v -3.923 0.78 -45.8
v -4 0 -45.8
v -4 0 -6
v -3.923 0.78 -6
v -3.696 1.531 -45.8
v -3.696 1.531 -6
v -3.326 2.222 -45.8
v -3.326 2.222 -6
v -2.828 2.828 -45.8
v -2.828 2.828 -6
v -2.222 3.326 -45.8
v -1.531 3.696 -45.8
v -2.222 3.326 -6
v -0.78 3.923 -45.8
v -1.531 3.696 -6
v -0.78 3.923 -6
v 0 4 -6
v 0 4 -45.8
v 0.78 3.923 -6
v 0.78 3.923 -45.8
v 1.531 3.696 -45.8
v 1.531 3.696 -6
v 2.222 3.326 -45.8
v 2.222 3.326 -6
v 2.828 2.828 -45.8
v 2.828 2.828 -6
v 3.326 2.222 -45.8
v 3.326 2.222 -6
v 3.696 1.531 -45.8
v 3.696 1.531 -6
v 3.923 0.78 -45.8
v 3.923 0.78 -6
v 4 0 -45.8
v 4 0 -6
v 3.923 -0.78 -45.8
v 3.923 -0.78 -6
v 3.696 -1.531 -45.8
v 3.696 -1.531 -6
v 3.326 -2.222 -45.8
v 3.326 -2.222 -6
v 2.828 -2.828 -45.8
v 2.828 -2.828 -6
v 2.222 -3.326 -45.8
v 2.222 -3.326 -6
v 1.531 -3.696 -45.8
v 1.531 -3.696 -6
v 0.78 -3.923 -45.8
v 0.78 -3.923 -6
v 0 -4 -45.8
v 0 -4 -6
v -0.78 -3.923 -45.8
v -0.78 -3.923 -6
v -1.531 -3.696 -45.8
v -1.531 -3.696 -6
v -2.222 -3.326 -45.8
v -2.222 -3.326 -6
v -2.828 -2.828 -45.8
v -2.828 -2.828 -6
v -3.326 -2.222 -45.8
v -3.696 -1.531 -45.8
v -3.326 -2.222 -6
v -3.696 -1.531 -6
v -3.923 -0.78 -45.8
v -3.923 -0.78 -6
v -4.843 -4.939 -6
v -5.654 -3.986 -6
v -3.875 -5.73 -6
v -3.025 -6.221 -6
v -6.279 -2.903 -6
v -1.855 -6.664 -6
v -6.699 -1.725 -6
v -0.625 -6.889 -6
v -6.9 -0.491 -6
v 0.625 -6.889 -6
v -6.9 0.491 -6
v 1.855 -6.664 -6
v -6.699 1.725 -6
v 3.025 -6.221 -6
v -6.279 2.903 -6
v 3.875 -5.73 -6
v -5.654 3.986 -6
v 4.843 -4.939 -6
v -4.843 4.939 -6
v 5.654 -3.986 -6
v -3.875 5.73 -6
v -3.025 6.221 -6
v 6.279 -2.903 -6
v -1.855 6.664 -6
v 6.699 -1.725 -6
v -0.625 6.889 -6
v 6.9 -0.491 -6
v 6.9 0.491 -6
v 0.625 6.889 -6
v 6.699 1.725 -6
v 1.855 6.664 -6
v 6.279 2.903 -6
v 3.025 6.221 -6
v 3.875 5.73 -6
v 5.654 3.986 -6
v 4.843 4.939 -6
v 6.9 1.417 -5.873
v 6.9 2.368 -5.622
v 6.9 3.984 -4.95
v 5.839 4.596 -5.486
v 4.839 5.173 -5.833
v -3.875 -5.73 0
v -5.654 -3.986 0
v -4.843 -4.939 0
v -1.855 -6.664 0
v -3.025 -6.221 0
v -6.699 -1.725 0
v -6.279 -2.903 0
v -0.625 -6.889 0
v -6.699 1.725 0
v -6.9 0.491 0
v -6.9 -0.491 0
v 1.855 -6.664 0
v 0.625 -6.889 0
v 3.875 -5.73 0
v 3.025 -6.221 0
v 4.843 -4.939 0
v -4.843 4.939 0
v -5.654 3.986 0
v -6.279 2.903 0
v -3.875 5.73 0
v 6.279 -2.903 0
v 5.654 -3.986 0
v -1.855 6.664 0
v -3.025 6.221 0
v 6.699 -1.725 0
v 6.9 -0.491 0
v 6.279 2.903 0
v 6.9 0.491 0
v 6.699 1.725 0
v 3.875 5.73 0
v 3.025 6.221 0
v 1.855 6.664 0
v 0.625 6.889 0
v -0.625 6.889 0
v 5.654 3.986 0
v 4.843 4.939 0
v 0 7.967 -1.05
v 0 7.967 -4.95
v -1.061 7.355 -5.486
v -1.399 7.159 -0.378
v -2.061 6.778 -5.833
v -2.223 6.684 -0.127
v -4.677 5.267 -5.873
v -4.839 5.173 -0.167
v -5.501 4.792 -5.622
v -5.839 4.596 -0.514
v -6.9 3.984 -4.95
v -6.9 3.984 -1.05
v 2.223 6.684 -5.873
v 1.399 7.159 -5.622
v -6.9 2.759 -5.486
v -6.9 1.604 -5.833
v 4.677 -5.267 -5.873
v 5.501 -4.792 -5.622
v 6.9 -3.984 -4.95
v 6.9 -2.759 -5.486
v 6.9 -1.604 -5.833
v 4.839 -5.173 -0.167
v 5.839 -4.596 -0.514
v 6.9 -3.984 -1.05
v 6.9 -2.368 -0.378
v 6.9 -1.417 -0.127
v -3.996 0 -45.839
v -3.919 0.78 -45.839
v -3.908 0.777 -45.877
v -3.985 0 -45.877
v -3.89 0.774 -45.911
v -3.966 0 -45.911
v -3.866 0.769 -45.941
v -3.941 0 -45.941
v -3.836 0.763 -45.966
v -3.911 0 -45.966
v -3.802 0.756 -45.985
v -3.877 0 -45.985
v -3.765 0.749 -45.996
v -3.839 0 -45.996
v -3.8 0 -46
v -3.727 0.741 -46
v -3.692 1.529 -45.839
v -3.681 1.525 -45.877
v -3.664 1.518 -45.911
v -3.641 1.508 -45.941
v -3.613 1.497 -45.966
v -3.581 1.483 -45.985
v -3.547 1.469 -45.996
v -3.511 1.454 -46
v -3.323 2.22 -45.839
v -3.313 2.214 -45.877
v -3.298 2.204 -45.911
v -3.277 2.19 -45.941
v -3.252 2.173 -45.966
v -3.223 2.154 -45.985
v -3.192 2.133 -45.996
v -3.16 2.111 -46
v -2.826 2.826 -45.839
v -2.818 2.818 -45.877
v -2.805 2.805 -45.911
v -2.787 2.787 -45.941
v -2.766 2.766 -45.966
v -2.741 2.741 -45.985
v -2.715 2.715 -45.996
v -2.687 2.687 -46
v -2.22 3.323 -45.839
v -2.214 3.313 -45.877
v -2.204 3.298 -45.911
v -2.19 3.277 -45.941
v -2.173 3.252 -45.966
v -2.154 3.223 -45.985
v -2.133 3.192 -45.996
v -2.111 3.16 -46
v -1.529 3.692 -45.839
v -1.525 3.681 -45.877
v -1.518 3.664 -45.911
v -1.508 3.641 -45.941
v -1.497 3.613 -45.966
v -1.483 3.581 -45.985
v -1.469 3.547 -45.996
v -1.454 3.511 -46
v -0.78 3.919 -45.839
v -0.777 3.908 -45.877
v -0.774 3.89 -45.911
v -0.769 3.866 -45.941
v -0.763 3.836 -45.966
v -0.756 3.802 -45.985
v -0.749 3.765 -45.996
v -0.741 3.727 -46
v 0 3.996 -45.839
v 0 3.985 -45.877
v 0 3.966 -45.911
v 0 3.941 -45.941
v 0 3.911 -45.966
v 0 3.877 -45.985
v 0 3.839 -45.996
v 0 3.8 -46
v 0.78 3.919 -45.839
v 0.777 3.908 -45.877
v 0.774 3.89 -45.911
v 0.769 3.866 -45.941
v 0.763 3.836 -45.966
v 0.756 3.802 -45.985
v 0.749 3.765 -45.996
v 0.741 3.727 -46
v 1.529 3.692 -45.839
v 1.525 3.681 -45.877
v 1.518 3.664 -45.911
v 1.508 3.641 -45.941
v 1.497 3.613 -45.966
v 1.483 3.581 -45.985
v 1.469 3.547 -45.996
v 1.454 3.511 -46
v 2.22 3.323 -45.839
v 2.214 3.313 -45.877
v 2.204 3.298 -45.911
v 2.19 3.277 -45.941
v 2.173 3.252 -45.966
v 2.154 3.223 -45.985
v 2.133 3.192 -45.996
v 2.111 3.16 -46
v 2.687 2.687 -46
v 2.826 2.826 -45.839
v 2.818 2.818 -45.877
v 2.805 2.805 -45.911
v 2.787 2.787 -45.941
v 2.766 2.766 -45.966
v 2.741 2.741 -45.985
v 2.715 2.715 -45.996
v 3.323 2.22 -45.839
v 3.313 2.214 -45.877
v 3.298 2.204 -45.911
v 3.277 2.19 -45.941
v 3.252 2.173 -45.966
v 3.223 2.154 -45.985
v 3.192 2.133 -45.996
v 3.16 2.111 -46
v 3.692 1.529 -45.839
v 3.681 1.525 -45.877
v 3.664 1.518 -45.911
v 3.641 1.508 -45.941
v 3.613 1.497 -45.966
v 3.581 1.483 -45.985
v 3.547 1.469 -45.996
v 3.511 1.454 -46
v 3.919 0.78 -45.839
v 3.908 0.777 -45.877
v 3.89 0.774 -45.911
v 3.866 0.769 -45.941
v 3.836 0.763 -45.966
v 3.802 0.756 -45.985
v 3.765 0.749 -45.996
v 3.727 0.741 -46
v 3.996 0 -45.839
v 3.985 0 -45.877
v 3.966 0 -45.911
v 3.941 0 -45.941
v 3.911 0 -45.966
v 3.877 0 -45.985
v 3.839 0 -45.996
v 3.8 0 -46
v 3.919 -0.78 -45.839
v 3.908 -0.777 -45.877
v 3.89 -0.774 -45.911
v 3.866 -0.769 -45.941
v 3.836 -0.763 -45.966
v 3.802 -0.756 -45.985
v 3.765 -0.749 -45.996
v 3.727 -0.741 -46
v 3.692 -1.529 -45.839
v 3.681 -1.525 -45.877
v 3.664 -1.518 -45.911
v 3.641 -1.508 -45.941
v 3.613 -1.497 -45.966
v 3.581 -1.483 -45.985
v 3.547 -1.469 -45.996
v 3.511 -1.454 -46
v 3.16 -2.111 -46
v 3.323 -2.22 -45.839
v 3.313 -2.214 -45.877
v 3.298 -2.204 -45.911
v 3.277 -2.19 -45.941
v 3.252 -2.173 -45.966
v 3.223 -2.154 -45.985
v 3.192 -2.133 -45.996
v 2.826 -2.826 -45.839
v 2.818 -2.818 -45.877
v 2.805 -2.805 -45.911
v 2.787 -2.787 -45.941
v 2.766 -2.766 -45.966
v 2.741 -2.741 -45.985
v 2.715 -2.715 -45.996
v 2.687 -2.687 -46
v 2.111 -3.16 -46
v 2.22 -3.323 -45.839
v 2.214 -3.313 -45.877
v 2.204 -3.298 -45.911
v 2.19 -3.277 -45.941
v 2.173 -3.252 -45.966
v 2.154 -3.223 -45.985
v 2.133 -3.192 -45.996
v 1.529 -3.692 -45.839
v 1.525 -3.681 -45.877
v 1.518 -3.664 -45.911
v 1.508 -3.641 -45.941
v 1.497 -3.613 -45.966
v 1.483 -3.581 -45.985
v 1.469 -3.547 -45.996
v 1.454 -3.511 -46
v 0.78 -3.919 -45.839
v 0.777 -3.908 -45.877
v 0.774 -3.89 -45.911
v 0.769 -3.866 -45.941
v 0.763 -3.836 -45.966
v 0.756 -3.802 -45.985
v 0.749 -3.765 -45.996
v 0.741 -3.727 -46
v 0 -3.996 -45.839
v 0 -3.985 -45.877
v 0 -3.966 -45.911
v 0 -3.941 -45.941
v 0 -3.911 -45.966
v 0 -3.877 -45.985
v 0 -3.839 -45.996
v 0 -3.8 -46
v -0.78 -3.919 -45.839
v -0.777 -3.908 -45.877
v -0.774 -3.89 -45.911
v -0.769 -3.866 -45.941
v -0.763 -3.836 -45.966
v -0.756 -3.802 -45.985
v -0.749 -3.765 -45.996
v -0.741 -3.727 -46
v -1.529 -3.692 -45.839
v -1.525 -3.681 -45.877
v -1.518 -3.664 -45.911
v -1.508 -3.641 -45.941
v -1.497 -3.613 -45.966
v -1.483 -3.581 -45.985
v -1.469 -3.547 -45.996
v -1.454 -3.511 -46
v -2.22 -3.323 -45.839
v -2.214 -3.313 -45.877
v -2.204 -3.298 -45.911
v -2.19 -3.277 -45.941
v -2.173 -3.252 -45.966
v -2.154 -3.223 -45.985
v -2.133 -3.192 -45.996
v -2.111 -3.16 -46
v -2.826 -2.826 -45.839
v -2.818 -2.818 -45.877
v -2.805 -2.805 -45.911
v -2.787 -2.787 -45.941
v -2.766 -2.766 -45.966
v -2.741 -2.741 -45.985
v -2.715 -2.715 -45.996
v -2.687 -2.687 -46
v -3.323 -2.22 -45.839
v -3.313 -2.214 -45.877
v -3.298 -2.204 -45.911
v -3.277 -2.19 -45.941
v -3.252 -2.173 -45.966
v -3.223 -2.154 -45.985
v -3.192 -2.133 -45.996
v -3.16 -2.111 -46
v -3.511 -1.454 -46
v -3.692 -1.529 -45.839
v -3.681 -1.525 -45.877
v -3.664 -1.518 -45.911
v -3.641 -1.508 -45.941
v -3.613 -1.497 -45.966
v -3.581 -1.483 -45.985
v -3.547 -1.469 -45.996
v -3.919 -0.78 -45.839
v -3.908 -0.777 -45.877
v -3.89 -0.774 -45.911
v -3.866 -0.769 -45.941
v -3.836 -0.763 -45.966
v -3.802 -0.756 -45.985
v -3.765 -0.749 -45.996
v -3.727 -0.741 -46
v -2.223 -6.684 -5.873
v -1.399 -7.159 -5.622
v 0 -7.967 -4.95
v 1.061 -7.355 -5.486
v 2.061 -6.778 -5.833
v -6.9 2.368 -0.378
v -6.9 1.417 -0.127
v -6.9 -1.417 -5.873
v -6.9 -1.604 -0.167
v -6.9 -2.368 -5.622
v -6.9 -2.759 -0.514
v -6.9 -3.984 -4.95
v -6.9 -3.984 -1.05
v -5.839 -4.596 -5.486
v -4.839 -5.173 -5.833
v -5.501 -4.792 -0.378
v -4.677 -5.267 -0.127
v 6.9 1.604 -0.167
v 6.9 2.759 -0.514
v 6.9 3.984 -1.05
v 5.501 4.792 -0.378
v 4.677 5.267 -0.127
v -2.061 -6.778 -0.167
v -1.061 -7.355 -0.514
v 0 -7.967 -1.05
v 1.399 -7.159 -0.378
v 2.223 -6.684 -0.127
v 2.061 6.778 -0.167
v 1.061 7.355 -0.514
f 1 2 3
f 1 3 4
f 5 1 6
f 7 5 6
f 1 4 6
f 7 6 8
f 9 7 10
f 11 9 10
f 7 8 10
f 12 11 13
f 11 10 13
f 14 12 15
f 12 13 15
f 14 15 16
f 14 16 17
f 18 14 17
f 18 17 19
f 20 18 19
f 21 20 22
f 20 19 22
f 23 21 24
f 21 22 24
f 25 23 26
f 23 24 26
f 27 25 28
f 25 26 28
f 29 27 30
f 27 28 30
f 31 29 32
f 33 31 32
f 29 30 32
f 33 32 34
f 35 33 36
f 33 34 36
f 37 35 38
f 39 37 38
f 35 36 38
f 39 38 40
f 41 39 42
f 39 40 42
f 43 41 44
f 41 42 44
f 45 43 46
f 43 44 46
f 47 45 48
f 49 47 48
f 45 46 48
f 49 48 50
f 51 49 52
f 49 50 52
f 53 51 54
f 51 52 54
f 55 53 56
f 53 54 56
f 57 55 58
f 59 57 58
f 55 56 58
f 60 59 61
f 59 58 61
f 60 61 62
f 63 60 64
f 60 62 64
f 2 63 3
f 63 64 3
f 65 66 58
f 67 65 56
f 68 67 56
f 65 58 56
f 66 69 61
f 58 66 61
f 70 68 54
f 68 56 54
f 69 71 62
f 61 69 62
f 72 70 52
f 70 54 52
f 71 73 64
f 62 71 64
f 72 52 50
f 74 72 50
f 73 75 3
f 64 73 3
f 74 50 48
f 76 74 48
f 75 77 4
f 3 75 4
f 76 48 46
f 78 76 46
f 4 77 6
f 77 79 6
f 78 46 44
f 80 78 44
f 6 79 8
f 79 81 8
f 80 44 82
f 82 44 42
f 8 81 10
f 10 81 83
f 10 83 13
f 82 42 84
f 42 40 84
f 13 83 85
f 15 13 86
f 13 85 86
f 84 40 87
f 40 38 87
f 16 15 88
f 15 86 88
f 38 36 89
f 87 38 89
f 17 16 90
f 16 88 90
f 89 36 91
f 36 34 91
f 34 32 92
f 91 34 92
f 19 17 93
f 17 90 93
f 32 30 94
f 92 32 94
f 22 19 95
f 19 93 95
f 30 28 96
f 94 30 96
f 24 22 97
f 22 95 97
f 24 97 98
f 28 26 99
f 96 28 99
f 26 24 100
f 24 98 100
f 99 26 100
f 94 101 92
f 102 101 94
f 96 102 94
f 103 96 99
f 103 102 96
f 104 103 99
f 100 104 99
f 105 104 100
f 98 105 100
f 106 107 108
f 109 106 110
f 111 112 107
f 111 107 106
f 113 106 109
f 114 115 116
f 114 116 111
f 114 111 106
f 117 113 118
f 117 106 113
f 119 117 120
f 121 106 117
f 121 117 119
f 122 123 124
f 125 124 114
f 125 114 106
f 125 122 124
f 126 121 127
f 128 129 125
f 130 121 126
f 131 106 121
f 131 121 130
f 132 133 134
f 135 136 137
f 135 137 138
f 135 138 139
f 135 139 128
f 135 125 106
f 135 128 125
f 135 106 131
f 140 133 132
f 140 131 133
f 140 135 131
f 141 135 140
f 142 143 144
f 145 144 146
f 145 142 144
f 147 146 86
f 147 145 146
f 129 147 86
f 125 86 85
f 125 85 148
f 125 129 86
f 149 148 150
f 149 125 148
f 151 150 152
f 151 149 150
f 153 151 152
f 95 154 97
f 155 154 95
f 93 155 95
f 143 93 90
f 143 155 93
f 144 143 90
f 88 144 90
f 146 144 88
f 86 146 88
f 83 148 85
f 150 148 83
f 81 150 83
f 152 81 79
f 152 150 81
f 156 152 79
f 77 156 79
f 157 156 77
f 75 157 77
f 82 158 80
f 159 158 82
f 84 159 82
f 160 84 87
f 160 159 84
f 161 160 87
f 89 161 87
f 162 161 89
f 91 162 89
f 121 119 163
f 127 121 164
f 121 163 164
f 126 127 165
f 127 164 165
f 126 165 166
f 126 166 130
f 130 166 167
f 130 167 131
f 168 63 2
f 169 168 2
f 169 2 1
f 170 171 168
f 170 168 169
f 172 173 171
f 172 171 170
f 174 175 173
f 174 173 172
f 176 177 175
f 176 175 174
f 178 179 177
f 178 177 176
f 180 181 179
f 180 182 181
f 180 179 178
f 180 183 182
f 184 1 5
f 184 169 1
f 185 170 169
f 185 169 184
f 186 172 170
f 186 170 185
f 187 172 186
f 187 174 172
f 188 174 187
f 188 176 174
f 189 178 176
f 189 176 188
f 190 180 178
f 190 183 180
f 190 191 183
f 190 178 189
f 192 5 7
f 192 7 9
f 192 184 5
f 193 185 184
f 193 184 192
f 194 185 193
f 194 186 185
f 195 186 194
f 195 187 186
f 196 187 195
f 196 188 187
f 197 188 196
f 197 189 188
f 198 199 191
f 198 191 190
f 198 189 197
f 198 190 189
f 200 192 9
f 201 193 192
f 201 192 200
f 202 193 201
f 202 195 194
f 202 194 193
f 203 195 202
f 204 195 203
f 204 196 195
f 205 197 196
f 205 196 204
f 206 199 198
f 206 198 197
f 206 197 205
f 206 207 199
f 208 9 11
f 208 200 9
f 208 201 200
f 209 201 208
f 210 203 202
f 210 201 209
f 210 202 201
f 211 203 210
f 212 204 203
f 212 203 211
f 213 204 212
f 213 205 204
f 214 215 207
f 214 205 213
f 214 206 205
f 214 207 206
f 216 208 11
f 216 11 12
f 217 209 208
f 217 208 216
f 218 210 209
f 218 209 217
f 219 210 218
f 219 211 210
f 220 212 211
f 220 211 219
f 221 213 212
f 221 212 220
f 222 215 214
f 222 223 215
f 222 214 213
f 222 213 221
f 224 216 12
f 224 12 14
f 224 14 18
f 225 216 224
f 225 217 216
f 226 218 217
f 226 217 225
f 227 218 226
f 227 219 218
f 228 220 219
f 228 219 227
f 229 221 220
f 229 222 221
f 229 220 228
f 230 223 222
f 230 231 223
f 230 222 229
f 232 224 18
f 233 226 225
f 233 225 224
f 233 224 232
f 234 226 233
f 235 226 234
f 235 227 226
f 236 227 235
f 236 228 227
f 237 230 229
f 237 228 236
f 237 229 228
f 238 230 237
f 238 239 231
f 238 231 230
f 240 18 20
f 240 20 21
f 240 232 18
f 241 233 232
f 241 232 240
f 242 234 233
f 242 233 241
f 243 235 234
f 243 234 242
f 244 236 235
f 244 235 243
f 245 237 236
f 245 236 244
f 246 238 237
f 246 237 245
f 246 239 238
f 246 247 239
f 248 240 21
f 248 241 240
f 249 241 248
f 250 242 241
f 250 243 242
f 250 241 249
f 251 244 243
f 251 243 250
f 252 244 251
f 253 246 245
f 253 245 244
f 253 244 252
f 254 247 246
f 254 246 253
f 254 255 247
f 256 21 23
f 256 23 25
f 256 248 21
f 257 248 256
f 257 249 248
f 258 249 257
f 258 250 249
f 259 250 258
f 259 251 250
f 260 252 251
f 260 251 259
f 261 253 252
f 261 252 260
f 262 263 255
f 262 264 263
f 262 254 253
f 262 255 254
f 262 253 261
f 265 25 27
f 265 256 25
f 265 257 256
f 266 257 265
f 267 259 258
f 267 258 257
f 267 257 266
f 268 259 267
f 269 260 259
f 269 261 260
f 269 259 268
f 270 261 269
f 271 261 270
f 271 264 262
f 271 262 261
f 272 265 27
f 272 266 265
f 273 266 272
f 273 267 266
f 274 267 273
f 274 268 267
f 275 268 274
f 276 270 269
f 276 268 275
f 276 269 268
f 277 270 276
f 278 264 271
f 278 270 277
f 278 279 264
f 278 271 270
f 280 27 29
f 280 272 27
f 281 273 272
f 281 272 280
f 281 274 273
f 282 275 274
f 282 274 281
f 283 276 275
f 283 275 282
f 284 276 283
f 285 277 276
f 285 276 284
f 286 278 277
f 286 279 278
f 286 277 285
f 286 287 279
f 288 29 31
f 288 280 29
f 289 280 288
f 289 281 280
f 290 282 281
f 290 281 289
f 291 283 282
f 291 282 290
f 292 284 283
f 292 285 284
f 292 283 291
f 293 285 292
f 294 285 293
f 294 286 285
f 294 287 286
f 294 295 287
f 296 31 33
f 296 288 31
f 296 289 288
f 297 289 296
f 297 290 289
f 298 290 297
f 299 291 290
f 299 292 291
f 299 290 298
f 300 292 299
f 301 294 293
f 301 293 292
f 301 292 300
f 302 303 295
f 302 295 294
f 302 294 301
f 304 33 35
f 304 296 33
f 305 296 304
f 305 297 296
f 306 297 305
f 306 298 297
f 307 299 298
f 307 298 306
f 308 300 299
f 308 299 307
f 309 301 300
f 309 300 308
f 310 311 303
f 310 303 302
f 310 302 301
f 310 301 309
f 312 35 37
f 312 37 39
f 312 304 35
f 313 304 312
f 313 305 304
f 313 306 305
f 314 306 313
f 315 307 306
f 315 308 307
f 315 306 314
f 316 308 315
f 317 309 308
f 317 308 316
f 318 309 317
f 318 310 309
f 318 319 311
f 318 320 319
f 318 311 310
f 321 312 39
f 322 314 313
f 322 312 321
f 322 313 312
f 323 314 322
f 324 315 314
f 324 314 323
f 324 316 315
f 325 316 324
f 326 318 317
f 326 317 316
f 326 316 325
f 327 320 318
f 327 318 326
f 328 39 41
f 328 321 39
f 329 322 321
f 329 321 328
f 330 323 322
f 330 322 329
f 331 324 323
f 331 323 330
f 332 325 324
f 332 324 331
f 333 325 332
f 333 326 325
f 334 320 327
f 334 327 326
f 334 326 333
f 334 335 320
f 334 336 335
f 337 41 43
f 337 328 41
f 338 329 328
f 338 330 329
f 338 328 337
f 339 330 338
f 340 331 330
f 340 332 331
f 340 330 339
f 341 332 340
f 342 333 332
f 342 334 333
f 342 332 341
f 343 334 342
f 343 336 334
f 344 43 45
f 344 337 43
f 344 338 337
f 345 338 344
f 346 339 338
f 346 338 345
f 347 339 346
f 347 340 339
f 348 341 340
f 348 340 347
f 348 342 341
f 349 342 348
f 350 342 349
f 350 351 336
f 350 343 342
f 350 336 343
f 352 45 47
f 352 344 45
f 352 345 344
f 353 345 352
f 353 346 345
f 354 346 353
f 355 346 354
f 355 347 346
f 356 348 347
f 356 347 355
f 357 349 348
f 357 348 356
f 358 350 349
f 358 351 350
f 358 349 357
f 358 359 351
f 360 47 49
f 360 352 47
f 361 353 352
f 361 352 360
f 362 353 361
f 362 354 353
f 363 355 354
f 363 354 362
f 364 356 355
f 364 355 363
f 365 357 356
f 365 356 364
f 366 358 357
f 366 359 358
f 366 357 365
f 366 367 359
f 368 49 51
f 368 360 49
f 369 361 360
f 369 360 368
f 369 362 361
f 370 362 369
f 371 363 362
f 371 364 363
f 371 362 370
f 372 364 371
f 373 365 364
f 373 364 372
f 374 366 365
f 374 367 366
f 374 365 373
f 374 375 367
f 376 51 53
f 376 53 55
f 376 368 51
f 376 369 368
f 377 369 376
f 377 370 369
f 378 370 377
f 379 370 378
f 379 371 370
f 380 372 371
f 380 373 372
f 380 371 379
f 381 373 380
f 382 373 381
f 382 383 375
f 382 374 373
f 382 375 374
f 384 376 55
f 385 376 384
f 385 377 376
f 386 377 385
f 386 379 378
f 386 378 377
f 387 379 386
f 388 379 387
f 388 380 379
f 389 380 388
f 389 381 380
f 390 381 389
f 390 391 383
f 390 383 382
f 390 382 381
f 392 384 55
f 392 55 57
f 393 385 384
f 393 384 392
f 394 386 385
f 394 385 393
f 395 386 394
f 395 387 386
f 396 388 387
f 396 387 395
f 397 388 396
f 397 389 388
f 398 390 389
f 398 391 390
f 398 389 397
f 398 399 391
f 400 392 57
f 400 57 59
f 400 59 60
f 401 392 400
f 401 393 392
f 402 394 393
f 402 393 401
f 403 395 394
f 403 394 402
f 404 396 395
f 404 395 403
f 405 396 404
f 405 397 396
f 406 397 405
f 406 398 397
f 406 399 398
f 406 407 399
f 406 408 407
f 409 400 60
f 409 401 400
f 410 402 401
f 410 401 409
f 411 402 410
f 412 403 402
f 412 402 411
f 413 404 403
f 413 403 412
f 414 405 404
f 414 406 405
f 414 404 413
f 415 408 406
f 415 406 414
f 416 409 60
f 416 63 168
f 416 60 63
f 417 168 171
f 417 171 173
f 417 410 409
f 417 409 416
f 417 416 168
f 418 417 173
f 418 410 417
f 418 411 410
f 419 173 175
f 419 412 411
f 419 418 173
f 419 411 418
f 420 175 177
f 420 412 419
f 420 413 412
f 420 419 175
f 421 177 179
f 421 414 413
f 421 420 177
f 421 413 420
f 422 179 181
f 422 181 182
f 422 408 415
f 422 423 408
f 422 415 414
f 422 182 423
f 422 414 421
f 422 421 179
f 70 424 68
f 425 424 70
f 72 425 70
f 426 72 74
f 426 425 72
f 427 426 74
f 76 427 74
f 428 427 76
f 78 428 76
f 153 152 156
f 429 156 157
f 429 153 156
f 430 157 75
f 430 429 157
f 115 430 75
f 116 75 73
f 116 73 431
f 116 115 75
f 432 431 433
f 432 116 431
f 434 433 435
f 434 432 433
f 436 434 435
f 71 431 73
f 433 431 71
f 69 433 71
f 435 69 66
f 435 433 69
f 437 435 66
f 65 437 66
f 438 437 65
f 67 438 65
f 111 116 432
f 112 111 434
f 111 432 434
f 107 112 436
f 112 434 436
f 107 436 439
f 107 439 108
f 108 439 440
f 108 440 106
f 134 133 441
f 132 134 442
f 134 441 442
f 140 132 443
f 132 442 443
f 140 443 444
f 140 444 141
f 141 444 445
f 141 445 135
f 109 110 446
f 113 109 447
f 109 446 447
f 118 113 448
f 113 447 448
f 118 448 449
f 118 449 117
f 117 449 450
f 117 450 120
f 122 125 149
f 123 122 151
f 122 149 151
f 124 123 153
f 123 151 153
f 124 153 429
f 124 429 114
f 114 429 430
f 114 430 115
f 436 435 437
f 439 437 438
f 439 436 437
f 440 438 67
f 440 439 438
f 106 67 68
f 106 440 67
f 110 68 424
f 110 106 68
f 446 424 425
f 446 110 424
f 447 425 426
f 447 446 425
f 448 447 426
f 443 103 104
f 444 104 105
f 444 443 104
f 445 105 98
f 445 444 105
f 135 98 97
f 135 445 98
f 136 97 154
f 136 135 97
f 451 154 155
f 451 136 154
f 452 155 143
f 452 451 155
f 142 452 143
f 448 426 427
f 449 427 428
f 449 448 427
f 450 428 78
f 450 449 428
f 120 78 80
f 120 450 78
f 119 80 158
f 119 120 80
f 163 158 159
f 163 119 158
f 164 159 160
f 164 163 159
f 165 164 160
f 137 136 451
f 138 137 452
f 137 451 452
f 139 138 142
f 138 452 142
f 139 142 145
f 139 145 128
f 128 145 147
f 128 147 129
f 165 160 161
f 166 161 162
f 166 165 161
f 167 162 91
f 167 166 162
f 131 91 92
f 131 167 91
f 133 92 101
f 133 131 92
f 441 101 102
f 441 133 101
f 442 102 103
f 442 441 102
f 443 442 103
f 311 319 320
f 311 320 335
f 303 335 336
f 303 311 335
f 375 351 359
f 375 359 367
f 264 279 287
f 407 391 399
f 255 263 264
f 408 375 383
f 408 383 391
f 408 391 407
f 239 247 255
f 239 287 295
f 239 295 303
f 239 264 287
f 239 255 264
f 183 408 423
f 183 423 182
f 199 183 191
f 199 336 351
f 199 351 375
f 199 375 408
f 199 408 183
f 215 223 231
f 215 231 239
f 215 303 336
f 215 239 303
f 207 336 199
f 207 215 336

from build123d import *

# Parameters (mm, degrees)
EXTRUDE_1_DEPTH = 6
SKETCH_2_R      = 4
EXTRUDE_2_DEPTH = 40
FILLET_3_R      = 0.2


with BuildPart() as part:
    # 草图1 → 凸台-拉伸1 (new body)
    with BuildSketch(Plane.XY):
        Polygon((0, 7.967433715), (-6.9, 3.983716857), (-6.9, -3.983716857), (0, -7.967433715), (6.9, -3.983716857), (6.9, 3.983716857), align=None)
    extrude(amount=-EXTRUDE_1_DEPTH)

    # 草图2 → 凸台-拉伸2 (add)
    with BuildSketch(Plane(origin=(0, 0, -6), x_dir=(-1, 0, 0), z_dir=(0, 0, -1))):
        Circle(SKETCH_2_R)
    extrude(amount=EXTRUDE_2_DEPTH)

    # 草图3 → 切除-旋转1 (revolve, cut)
    with BuildSketch(Plane(origin=(0, 0, 0), x_dir=(0, 0, -1), z_dir=(1, 0, 0))):
        Polygon((0, -6.917433715), (1.05, -7.967433715), (0, -7.967433715), align=None)
        Polygon((6, -6.917433715), (4.95, -7.967433715), (6, -7.967433715), align=None)
    revolve(axis=Axis((0, 0, 0), (0, 0, 1)), mode=Mode.SUBTRACT)

    # 圆角3
    fillet_3_edges = [part.edges().sort_by_distance(p)[0] for p in [
        (4, 0, -46),
    ]]
    fillet(fillet_3_edges, radius=FILLET_3_R)


solid = part.part
